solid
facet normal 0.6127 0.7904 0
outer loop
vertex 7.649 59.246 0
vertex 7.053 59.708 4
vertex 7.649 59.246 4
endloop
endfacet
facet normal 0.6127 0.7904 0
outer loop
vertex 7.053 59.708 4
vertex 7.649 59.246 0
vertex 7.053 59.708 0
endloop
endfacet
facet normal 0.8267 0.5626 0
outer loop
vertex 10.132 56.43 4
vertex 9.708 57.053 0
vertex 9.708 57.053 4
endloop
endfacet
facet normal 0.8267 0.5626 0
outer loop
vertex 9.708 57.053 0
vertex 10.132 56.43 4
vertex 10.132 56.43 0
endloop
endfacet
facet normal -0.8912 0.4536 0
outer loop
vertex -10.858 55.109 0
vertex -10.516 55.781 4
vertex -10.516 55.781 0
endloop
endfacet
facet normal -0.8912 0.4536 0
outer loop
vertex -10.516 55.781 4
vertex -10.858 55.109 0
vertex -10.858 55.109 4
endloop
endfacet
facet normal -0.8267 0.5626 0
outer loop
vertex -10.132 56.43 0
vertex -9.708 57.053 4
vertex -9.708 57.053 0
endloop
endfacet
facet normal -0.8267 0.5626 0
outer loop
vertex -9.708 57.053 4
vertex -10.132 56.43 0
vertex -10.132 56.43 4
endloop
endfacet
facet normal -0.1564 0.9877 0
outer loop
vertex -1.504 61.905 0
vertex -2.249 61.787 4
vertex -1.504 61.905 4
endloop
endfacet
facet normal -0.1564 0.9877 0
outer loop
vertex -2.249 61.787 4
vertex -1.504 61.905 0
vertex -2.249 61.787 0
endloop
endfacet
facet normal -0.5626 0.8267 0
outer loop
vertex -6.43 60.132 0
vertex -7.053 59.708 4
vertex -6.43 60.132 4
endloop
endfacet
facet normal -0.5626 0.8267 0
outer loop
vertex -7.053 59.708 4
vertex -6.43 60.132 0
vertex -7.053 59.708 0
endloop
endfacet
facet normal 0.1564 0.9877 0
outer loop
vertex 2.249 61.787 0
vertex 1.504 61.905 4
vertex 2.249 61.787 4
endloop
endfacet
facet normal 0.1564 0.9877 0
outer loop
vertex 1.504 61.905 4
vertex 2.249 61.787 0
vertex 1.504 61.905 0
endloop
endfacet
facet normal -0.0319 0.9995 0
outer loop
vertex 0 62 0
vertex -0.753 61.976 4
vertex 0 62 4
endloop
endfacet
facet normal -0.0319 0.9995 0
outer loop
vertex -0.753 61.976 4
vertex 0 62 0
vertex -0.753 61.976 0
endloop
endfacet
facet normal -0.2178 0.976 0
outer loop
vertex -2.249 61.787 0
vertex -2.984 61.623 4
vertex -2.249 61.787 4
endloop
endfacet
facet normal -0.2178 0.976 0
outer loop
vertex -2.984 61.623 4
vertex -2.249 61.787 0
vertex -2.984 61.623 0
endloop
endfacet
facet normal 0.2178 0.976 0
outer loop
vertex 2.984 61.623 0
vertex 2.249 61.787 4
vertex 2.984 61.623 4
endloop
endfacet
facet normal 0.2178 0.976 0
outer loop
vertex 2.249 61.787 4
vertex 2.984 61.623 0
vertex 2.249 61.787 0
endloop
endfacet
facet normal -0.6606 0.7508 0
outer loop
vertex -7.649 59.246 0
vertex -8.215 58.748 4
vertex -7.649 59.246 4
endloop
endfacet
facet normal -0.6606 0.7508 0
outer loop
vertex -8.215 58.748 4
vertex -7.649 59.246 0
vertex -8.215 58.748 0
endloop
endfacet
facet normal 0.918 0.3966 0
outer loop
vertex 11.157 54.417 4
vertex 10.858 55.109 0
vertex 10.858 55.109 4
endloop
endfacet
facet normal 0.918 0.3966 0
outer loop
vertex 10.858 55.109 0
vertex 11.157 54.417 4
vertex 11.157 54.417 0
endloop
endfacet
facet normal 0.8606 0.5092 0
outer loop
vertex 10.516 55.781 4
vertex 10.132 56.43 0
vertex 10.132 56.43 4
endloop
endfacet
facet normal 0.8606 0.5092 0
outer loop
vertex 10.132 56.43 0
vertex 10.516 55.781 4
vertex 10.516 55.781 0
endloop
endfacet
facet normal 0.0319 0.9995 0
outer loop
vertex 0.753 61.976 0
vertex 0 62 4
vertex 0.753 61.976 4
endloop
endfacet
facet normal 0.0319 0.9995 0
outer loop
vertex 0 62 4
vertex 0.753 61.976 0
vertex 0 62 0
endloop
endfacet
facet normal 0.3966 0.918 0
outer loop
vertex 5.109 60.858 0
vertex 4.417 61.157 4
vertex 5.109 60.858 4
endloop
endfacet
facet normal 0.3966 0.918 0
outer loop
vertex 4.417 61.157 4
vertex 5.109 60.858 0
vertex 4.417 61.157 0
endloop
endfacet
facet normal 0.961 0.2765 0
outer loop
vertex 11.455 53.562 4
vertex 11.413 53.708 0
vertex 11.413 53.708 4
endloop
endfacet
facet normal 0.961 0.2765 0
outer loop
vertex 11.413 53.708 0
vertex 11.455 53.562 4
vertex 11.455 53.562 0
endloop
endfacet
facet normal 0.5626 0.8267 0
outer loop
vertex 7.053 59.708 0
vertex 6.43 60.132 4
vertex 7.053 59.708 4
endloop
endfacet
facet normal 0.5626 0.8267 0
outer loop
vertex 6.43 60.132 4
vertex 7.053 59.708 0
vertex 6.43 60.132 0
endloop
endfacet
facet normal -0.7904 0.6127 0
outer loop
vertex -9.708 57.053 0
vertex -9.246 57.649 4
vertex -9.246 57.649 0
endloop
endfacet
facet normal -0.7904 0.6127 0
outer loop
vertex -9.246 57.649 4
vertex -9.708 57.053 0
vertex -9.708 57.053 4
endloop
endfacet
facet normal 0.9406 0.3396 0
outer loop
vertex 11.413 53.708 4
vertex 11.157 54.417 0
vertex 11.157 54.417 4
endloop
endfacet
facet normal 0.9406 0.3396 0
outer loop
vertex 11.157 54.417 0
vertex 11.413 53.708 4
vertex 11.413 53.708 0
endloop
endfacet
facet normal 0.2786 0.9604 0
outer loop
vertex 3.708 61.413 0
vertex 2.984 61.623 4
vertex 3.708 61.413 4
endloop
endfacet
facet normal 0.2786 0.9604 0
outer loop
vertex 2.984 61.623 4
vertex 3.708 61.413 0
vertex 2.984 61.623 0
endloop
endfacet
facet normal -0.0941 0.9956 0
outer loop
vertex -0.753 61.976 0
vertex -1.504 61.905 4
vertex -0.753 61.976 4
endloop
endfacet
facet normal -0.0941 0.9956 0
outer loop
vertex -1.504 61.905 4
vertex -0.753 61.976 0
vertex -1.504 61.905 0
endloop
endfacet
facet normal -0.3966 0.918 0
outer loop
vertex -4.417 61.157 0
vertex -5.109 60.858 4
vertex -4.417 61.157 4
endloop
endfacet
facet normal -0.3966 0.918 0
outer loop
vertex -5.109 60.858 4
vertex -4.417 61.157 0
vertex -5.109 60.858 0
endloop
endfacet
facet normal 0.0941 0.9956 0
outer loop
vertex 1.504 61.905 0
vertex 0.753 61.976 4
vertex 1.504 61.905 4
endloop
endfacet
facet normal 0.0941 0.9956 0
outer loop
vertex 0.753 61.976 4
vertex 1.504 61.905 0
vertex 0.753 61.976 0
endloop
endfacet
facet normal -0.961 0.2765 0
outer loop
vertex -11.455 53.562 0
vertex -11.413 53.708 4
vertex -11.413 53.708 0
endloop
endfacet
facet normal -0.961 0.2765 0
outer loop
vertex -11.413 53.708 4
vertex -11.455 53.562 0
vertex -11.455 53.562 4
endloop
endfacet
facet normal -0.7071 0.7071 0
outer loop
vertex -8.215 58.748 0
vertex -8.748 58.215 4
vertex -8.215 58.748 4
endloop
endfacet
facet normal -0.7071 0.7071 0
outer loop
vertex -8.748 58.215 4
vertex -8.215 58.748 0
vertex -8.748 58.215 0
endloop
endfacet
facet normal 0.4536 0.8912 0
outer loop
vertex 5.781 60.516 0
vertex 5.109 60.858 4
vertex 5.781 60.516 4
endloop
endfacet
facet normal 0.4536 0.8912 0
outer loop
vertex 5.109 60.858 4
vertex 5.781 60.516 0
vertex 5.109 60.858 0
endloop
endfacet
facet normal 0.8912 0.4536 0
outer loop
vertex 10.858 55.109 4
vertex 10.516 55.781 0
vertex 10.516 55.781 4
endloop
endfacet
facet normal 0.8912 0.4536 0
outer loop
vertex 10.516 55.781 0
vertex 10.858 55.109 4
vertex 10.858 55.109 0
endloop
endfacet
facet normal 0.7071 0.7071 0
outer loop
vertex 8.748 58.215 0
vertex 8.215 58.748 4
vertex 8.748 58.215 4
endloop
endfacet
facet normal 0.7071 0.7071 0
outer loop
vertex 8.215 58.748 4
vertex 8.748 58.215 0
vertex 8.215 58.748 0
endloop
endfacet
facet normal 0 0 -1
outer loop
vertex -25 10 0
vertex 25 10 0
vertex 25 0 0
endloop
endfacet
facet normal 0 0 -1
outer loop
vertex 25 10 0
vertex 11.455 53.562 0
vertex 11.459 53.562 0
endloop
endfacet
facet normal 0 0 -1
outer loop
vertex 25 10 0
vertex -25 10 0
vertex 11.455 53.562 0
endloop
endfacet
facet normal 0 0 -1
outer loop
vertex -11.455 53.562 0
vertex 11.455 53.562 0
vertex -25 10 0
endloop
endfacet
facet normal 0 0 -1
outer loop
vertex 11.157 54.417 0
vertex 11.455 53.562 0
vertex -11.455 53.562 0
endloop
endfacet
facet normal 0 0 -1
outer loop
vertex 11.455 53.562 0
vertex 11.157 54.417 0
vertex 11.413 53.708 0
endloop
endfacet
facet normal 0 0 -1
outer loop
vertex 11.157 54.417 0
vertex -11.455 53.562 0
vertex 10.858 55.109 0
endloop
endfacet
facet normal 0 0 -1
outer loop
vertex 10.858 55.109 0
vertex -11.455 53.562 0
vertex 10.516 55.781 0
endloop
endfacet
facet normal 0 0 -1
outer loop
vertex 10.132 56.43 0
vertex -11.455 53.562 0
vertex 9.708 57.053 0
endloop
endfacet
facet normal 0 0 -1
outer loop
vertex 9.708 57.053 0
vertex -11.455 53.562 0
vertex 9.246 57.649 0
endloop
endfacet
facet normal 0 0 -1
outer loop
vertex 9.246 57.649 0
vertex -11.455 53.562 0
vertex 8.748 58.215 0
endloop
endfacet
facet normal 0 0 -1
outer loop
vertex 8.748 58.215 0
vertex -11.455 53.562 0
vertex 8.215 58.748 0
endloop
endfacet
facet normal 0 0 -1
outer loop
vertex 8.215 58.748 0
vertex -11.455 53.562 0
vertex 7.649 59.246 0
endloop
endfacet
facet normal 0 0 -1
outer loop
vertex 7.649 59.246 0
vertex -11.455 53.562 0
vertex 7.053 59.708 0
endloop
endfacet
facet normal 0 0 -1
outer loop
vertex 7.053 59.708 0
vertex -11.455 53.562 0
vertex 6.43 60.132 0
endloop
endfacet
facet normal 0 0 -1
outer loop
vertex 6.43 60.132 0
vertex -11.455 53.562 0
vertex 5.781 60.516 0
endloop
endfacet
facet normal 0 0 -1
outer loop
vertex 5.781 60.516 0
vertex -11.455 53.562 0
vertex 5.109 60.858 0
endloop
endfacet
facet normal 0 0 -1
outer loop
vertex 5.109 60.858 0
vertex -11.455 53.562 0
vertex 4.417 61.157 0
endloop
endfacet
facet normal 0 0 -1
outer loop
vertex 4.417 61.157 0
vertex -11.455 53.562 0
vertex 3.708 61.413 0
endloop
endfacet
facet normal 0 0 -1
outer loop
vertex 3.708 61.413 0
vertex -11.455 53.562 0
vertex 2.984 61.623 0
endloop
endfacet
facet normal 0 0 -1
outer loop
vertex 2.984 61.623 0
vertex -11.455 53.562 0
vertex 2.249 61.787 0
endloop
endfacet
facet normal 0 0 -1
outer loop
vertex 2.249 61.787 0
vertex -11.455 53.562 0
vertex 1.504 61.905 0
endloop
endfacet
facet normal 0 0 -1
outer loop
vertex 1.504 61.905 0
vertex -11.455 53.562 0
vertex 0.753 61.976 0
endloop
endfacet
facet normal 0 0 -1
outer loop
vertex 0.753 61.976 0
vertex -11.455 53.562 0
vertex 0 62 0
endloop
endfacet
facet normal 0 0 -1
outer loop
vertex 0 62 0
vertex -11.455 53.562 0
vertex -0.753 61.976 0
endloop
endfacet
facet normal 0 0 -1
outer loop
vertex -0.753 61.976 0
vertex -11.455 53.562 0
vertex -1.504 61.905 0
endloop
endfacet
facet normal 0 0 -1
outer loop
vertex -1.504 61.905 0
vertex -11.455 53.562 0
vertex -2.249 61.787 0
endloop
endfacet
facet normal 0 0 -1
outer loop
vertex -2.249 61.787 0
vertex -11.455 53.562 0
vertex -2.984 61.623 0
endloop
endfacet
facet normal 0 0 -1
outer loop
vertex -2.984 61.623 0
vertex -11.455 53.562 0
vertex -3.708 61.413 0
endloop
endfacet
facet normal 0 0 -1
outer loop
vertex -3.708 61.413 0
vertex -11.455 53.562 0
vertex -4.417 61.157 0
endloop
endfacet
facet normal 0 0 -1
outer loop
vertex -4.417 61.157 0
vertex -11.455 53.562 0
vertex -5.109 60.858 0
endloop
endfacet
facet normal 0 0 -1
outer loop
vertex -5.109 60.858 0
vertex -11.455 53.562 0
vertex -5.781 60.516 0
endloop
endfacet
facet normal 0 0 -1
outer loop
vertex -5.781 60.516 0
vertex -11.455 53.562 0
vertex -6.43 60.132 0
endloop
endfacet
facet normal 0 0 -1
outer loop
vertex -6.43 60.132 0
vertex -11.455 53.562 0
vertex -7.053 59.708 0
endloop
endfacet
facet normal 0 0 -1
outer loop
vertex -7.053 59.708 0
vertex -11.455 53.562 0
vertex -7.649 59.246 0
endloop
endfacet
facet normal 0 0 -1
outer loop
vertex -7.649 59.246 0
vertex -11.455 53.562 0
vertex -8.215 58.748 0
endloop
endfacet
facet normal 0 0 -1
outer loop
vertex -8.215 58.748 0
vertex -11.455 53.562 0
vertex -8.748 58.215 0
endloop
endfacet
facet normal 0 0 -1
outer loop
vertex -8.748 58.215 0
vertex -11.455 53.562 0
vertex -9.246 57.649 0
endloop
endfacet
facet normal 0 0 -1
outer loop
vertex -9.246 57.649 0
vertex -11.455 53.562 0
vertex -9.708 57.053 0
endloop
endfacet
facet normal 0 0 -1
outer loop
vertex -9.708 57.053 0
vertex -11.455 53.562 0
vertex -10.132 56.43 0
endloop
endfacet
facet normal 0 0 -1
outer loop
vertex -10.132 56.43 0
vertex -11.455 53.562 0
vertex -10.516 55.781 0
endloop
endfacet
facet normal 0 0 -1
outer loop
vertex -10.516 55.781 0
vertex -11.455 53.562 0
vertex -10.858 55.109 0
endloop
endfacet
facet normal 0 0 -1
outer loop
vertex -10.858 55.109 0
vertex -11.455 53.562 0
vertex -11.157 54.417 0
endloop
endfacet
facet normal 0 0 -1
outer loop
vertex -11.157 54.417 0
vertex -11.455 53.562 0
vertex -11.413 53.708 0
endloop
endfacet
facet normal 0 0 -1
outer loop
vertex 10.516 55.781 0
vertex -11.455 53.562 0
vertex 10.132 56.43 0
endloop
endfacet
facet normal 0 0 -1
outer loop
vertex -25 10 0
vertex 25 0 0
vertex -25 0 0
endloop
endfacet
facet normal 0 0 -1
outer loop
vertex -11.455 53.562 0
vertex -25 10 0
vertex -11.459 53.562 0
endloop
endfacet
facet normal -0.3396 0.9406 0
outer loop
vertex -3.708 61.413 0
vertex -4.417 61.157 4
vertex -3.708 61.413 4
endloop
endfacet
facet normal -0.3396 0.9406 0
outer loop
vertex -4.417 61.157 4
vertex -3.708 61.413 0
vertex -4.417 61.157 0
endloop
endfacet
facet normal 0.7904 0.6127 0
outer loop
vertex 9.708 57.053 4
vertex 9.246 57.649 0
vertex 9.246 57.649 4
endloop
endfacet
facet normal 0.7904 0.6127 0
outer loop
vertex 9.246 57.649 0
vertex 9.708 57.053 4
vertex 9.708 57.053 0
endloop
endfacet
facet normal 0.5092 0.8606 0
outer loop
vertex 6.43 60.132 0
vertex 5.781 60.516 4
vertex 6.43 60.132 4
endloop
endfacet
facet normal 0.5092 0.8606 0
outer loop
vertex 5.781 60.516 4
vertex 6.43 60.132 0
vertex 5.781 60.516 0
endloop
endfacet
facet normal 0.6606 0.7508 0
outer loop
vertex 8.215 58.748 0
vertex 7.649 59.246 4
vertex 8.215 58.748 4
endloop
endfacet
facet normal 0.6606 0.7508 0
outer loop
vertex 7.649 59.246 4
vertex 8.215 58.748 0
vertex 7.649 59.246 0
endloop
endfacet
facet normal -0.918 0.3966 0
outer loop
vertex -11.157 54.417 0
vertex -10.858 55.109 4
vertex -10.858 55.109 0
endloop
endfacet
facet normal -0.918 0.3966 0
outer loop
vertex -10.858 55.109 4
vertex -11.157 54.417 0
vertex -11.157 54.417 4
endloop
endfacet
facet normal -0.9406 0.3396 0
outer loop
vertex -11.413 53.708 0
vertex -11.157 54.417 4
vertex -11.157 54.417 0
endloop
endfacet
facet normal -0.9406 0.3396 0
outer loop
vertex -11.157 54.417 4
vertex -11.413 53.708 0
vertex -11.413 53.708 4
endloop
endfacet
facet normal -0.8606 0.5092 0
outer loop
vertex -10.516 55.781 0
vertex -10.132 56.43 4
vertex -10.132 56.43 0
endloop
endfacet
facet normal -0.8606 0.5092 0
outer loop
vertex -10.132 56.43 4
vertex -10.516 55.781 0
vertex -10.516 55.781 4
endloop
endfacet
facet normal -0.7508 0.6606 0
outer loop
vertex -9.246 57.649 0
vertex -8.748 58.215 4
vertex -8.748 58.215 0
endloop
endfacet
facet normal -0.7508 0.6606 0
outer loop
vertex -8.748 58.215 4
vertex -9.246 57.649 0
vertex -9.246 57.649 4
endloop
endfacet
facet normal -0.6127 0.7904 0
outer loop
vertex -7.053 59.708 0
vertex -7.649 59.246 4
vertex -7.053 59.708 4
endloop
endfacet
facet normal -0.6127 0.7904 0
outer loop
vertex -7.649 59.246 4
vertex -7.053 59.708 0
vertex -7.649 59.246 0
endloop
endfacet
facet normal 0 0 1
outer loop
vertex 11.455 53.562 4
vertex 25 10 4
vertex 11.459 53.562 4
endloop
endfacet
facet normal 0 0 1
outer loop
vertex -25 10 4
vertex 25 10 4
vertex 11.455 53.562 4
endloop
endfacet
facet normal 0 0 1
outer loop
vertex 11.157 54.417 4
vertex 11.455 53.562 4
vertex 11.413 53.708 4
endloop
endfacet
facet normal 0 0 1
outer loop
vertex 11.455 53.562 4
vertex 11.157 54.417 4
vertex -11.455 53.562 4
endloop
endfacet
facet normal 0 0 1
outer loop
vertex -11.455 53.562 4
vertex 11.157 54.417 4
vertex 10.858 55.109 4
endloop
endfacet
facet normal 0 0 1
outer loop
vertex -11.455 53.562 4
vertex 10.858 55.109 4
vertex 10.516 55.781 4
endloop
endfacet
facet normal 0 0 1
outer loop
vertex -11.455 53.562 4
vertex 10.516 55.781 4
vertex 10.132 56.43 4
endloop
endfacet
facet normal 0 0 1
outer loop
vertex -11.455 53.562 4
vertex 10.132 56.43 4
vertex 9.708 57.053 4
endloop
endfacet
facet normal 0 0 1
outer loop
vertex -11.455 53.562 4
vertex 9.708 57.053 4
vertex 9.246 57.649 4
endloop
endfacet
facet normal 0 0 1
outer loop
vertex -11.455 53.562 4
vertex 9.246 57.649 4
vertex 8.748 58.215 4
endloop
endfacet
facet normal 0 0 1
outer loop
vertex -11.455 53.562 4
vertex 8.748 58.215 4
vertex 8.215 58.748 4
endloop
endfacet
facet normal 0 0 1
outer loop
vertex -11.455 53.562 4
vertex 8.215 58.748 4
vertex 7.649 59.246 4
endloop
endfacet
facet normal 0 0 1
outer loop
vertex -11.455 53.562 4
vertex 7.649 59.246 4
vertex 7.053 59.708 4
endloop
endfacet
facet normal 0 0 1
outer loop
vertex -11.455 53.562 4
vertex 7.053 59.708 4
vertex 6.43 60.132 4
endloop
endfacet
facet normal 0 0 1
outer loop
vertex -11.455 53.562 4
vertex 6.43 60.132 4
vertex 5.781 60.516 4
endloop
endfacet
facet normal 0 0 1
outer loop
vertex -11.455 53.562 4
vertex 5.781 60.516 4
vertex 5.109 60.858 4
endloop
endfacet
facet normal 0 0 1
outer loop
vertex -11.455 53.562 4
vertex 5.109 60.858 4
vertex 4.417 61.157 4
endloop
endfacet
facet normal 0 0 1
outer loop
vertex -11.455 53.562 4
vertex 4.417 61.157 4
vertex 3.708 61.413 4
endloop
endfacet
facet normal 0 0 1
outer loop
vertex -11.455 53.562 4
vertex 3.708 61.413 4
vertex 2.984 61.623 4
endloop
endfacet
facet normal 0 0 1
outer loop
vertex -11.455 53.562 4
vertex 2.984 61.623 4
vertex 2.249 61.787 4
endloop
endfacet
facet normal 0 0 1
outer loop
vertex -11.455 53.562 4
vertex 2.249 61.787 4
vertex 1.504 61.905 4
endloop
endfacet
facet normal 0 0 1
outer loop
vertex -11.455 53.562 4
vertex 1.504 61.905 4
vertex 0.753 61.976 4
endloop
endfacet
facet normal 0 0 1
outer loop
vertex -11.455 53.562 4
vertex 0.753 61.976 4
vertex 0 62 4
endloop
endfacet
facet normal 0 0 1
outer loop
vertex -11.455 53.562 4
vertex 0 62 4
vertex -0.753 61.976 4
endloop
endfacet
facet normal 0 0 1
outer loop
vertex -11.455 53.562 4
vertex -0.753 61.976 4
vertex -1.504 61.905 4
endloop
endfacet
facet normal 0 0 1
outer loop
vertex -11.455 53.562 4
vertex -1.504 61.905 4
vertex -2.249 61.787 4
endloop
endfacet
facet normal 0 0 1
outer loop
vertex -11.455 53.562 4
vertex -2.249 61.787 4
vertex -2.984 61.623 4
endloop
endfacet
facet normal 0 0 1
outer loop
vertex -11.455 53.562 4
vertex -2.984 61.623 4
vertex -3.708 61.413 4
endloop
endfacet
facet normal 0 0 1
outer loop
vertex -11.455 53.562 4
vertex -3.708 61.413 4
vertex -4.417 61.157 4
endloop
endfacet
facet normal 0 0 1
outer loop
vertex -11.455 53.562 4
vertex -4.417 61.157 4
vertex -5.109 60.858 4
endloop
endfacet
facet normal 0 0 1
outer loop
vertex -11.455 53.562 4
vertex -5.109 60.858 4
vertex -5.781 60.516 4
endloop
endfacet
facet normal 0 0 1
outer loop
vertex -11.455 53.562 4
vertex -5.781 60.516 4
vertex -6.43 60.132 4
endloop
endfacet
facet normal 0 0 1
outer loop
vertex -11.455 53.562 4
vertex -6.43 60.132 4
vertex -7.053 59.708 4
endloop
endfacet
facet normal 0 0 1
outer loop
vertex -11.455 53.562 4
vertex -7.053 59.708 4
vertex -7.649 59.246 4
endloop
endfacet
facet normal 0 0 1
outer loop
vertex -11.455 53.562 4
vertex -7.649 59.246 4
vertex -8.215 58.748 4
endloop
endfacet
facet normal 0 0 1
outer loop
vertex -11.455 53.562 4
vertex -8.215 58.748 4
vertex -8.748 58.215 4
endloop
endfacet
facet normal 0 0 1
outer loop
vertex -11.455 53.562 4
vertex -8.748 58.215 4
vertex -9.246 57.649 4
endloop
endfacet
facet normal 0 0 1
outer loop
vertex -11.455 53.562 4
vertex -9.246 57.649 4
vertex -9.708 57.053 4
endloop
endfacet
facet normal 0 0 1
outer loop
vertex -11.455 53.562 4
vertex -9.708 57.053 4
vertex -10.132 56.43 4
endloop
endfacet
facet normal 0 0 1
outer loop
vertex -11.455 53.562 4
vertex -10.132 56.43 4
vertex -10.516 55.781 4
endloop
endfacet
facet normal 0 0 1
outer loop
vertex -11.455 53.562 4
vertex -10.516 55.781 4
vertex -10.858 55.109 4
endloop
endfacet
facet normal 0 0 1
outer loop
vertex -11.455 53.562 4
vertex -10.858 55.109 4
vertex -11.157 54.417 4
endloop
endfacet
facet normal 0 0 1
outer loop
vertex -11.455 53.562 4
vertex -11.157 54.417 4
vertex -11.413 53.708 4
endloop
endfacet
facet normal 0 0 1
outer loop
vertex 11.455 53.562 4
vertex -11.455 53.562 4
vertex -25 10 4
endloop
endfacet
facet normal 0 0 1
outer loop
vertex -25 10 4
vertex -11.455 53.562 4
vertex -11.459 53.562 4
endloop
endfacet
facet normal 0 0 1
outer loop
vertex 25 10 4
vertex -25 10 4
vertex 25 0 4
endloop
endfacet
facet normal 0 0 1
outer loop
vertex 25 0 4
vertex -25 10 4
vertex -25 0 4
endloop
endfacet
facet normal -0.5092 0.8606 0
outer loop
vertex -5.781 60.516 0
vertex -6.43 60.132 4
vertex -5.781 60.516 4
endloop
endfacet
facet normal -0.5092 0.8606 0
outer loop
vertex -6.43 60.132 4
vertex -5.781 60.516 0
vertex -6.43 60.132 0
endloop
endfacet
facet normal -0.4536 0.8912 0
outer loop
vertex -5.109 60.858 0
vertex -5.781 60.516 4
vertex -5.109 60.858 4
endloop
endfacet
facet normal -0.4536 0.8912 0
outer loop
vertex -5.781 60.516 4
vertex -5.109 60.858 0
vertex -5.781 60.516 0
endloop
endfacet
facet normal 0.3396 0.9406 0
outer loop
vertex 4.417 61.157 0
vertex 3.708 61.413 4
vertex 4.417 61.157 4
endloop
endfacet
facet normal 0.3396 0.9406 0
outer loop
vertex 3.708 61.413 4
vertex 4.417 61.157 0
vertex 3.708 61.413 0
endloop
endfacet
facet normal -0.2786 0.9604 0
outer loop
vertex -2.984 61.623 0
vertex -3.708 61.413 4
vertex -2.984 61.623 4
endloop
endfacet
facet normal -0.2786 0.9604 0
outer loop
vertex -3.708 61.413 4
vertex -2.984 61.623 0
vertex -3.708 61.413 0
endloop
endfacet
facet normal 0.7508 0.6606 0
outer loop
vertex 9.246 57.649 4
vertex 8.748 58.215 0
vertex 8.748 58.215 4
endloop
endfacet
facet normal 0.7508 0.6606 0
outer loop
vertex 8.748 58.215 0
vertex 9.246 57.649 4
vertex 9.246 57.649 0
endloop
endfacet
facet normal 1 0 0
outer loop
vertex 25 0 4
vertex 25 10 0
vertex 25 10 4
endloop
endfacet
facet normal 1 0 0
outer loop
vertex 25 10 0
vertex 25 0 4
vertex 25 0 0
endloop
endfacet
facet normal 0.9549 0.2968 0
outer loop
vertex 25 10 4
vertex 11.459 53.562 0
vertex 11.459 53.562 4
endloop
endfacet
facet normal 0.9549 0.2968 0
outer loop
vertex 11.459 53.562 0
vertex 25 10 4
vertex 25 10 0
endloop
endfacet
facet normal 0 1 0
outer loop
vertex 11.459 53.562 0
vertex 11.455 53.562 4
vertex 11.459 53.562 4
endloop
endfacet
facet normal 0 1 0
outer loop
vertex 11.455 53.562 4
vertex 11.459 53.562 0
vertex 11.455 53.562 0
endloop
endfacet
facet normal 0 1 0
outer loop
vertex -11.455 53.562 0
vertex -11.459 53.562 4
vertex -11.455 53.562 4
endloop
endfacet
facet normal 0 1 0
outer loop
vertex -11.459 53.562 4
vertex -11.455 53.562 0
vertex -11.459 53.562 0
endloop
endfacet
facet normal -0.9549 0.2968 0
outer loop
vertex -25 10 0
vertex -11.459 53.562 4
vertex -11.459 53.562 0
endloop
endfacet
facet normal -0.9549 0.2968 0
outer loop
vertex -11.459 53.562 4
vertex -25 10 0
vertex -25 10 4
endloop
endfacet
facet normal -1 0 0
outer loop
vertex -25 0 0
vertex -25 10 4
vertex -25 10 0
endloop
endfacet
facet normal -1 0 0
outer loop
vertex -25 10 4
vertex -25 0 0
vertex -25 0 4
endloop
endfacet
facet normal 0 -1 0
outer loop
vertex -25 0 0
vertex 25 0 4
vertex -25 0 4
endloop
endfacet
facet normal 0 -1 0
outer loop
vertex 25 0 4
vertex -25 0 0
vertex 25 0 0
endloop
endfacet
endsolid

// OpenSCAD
//-------------------------------------------------------------------------
//-- ear.scad
//-------------------------------------------------------------------------
//--This file has been generated automatically according to your data.
//--For more info, visit: http://iearobotics.com/oomlwiki/
//--------------------------------------------------------------------------

union() {
  linear_extrude(height=4.000, twist=0, $fn=100, convexity=10, center=false) {
    translate(v=[0.000, 50.000, 0.000]) {
      circle(r=12.000, $fn=100);
    } // End translate
  } // End linear_extrude
  polyhedron(points=[[0.000, 0.000, 0.000], [0.000, 0.000, 4.000], [25.000, 0.000, 0.000], [25.000, 0.000, 4.000], [25.000, 10.000, 0.000], [25.000, 10.000, 4.000], [11.459, 53.562, 0.000], [11.459, 53.562, 4.000], [-11.459, 53.562, 0.000], [-11.459, 53.562, 4.000], [-25.000, 10.000, 0.000], [-25.000, 10.000, 4.000], [-25.000, 0.000, 0.000], [-25.000, 0.000, 4.000]], triangles=[[1, 3, 5], [12, 10, 0], [1, 5, 7], [10, 8, 0], [1, 7, 9], [8, 6, 0], [1, 9, 11], [6, 4, 0], [1, 11, 13], [4, 2, 0], [0, 3, 1], [0, 2, 3], [2, 5, 3], [2, 4, 5], [4, 7, 5], [4, 6, 7], [6, 9, 7], [6, 8, 9], [8, 11, 9], [8, 10, 11], [10, 13, 11], [10, 12, 13], [12, 1, 13], [12, 0, 1]]);
} // End union
